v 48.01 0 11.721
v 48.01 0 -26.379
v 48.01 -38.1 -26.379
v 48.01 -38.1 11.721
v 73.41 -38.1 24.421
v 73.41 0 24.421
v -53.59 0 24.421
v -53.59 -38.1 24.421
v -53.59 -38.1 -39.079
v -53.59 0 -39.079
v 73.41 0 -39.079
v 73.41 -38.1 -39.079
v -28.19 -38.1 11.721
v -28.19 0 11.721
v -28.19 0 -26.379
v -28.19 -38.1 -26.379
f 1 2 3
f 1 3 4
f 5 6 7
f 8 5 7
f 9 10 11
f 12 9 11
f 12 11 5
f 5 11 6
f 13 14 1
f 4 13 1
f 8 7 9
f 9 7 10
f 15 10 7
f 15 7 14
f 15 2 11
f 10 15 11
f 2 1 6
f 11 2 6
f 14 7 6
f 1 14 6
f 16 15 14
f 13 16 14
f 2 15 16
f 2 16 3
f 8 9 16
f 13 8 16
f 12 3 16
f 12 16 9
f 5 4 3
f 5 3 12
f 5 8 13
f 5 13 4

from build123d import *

# Parameters (mm, degrees)
F0_W     = 76.2
F0_H     = 38.1
F1_DEPTH = 38.1


with BuildPart() as f1:
    # F0 (on Front) → F1 (new body)
    with BuildSketch(Plane.XZ):
        Polygon((-53.589837, -26.378524), (-53.589837, -39.078524), (-28.189837, -39.078524), (48.010163, -39.078524), (73.410163, -39.078524), (73.410163, -26.378524), (73.410163, 11.721476), (73.410163, 24.421476), (48.010163, 24.421476), (-28.189837, 24.421476), (-53.589837, 24.421476), (-53.589837, 11.721476), align=None)
        with Locations((9.910163, -7.328524)):
            Rectangle(F0_W, F0_H, mode=Mode.SUBTRACT)
    extrude(amount=F1_DEPTH)


solid = f1.part
